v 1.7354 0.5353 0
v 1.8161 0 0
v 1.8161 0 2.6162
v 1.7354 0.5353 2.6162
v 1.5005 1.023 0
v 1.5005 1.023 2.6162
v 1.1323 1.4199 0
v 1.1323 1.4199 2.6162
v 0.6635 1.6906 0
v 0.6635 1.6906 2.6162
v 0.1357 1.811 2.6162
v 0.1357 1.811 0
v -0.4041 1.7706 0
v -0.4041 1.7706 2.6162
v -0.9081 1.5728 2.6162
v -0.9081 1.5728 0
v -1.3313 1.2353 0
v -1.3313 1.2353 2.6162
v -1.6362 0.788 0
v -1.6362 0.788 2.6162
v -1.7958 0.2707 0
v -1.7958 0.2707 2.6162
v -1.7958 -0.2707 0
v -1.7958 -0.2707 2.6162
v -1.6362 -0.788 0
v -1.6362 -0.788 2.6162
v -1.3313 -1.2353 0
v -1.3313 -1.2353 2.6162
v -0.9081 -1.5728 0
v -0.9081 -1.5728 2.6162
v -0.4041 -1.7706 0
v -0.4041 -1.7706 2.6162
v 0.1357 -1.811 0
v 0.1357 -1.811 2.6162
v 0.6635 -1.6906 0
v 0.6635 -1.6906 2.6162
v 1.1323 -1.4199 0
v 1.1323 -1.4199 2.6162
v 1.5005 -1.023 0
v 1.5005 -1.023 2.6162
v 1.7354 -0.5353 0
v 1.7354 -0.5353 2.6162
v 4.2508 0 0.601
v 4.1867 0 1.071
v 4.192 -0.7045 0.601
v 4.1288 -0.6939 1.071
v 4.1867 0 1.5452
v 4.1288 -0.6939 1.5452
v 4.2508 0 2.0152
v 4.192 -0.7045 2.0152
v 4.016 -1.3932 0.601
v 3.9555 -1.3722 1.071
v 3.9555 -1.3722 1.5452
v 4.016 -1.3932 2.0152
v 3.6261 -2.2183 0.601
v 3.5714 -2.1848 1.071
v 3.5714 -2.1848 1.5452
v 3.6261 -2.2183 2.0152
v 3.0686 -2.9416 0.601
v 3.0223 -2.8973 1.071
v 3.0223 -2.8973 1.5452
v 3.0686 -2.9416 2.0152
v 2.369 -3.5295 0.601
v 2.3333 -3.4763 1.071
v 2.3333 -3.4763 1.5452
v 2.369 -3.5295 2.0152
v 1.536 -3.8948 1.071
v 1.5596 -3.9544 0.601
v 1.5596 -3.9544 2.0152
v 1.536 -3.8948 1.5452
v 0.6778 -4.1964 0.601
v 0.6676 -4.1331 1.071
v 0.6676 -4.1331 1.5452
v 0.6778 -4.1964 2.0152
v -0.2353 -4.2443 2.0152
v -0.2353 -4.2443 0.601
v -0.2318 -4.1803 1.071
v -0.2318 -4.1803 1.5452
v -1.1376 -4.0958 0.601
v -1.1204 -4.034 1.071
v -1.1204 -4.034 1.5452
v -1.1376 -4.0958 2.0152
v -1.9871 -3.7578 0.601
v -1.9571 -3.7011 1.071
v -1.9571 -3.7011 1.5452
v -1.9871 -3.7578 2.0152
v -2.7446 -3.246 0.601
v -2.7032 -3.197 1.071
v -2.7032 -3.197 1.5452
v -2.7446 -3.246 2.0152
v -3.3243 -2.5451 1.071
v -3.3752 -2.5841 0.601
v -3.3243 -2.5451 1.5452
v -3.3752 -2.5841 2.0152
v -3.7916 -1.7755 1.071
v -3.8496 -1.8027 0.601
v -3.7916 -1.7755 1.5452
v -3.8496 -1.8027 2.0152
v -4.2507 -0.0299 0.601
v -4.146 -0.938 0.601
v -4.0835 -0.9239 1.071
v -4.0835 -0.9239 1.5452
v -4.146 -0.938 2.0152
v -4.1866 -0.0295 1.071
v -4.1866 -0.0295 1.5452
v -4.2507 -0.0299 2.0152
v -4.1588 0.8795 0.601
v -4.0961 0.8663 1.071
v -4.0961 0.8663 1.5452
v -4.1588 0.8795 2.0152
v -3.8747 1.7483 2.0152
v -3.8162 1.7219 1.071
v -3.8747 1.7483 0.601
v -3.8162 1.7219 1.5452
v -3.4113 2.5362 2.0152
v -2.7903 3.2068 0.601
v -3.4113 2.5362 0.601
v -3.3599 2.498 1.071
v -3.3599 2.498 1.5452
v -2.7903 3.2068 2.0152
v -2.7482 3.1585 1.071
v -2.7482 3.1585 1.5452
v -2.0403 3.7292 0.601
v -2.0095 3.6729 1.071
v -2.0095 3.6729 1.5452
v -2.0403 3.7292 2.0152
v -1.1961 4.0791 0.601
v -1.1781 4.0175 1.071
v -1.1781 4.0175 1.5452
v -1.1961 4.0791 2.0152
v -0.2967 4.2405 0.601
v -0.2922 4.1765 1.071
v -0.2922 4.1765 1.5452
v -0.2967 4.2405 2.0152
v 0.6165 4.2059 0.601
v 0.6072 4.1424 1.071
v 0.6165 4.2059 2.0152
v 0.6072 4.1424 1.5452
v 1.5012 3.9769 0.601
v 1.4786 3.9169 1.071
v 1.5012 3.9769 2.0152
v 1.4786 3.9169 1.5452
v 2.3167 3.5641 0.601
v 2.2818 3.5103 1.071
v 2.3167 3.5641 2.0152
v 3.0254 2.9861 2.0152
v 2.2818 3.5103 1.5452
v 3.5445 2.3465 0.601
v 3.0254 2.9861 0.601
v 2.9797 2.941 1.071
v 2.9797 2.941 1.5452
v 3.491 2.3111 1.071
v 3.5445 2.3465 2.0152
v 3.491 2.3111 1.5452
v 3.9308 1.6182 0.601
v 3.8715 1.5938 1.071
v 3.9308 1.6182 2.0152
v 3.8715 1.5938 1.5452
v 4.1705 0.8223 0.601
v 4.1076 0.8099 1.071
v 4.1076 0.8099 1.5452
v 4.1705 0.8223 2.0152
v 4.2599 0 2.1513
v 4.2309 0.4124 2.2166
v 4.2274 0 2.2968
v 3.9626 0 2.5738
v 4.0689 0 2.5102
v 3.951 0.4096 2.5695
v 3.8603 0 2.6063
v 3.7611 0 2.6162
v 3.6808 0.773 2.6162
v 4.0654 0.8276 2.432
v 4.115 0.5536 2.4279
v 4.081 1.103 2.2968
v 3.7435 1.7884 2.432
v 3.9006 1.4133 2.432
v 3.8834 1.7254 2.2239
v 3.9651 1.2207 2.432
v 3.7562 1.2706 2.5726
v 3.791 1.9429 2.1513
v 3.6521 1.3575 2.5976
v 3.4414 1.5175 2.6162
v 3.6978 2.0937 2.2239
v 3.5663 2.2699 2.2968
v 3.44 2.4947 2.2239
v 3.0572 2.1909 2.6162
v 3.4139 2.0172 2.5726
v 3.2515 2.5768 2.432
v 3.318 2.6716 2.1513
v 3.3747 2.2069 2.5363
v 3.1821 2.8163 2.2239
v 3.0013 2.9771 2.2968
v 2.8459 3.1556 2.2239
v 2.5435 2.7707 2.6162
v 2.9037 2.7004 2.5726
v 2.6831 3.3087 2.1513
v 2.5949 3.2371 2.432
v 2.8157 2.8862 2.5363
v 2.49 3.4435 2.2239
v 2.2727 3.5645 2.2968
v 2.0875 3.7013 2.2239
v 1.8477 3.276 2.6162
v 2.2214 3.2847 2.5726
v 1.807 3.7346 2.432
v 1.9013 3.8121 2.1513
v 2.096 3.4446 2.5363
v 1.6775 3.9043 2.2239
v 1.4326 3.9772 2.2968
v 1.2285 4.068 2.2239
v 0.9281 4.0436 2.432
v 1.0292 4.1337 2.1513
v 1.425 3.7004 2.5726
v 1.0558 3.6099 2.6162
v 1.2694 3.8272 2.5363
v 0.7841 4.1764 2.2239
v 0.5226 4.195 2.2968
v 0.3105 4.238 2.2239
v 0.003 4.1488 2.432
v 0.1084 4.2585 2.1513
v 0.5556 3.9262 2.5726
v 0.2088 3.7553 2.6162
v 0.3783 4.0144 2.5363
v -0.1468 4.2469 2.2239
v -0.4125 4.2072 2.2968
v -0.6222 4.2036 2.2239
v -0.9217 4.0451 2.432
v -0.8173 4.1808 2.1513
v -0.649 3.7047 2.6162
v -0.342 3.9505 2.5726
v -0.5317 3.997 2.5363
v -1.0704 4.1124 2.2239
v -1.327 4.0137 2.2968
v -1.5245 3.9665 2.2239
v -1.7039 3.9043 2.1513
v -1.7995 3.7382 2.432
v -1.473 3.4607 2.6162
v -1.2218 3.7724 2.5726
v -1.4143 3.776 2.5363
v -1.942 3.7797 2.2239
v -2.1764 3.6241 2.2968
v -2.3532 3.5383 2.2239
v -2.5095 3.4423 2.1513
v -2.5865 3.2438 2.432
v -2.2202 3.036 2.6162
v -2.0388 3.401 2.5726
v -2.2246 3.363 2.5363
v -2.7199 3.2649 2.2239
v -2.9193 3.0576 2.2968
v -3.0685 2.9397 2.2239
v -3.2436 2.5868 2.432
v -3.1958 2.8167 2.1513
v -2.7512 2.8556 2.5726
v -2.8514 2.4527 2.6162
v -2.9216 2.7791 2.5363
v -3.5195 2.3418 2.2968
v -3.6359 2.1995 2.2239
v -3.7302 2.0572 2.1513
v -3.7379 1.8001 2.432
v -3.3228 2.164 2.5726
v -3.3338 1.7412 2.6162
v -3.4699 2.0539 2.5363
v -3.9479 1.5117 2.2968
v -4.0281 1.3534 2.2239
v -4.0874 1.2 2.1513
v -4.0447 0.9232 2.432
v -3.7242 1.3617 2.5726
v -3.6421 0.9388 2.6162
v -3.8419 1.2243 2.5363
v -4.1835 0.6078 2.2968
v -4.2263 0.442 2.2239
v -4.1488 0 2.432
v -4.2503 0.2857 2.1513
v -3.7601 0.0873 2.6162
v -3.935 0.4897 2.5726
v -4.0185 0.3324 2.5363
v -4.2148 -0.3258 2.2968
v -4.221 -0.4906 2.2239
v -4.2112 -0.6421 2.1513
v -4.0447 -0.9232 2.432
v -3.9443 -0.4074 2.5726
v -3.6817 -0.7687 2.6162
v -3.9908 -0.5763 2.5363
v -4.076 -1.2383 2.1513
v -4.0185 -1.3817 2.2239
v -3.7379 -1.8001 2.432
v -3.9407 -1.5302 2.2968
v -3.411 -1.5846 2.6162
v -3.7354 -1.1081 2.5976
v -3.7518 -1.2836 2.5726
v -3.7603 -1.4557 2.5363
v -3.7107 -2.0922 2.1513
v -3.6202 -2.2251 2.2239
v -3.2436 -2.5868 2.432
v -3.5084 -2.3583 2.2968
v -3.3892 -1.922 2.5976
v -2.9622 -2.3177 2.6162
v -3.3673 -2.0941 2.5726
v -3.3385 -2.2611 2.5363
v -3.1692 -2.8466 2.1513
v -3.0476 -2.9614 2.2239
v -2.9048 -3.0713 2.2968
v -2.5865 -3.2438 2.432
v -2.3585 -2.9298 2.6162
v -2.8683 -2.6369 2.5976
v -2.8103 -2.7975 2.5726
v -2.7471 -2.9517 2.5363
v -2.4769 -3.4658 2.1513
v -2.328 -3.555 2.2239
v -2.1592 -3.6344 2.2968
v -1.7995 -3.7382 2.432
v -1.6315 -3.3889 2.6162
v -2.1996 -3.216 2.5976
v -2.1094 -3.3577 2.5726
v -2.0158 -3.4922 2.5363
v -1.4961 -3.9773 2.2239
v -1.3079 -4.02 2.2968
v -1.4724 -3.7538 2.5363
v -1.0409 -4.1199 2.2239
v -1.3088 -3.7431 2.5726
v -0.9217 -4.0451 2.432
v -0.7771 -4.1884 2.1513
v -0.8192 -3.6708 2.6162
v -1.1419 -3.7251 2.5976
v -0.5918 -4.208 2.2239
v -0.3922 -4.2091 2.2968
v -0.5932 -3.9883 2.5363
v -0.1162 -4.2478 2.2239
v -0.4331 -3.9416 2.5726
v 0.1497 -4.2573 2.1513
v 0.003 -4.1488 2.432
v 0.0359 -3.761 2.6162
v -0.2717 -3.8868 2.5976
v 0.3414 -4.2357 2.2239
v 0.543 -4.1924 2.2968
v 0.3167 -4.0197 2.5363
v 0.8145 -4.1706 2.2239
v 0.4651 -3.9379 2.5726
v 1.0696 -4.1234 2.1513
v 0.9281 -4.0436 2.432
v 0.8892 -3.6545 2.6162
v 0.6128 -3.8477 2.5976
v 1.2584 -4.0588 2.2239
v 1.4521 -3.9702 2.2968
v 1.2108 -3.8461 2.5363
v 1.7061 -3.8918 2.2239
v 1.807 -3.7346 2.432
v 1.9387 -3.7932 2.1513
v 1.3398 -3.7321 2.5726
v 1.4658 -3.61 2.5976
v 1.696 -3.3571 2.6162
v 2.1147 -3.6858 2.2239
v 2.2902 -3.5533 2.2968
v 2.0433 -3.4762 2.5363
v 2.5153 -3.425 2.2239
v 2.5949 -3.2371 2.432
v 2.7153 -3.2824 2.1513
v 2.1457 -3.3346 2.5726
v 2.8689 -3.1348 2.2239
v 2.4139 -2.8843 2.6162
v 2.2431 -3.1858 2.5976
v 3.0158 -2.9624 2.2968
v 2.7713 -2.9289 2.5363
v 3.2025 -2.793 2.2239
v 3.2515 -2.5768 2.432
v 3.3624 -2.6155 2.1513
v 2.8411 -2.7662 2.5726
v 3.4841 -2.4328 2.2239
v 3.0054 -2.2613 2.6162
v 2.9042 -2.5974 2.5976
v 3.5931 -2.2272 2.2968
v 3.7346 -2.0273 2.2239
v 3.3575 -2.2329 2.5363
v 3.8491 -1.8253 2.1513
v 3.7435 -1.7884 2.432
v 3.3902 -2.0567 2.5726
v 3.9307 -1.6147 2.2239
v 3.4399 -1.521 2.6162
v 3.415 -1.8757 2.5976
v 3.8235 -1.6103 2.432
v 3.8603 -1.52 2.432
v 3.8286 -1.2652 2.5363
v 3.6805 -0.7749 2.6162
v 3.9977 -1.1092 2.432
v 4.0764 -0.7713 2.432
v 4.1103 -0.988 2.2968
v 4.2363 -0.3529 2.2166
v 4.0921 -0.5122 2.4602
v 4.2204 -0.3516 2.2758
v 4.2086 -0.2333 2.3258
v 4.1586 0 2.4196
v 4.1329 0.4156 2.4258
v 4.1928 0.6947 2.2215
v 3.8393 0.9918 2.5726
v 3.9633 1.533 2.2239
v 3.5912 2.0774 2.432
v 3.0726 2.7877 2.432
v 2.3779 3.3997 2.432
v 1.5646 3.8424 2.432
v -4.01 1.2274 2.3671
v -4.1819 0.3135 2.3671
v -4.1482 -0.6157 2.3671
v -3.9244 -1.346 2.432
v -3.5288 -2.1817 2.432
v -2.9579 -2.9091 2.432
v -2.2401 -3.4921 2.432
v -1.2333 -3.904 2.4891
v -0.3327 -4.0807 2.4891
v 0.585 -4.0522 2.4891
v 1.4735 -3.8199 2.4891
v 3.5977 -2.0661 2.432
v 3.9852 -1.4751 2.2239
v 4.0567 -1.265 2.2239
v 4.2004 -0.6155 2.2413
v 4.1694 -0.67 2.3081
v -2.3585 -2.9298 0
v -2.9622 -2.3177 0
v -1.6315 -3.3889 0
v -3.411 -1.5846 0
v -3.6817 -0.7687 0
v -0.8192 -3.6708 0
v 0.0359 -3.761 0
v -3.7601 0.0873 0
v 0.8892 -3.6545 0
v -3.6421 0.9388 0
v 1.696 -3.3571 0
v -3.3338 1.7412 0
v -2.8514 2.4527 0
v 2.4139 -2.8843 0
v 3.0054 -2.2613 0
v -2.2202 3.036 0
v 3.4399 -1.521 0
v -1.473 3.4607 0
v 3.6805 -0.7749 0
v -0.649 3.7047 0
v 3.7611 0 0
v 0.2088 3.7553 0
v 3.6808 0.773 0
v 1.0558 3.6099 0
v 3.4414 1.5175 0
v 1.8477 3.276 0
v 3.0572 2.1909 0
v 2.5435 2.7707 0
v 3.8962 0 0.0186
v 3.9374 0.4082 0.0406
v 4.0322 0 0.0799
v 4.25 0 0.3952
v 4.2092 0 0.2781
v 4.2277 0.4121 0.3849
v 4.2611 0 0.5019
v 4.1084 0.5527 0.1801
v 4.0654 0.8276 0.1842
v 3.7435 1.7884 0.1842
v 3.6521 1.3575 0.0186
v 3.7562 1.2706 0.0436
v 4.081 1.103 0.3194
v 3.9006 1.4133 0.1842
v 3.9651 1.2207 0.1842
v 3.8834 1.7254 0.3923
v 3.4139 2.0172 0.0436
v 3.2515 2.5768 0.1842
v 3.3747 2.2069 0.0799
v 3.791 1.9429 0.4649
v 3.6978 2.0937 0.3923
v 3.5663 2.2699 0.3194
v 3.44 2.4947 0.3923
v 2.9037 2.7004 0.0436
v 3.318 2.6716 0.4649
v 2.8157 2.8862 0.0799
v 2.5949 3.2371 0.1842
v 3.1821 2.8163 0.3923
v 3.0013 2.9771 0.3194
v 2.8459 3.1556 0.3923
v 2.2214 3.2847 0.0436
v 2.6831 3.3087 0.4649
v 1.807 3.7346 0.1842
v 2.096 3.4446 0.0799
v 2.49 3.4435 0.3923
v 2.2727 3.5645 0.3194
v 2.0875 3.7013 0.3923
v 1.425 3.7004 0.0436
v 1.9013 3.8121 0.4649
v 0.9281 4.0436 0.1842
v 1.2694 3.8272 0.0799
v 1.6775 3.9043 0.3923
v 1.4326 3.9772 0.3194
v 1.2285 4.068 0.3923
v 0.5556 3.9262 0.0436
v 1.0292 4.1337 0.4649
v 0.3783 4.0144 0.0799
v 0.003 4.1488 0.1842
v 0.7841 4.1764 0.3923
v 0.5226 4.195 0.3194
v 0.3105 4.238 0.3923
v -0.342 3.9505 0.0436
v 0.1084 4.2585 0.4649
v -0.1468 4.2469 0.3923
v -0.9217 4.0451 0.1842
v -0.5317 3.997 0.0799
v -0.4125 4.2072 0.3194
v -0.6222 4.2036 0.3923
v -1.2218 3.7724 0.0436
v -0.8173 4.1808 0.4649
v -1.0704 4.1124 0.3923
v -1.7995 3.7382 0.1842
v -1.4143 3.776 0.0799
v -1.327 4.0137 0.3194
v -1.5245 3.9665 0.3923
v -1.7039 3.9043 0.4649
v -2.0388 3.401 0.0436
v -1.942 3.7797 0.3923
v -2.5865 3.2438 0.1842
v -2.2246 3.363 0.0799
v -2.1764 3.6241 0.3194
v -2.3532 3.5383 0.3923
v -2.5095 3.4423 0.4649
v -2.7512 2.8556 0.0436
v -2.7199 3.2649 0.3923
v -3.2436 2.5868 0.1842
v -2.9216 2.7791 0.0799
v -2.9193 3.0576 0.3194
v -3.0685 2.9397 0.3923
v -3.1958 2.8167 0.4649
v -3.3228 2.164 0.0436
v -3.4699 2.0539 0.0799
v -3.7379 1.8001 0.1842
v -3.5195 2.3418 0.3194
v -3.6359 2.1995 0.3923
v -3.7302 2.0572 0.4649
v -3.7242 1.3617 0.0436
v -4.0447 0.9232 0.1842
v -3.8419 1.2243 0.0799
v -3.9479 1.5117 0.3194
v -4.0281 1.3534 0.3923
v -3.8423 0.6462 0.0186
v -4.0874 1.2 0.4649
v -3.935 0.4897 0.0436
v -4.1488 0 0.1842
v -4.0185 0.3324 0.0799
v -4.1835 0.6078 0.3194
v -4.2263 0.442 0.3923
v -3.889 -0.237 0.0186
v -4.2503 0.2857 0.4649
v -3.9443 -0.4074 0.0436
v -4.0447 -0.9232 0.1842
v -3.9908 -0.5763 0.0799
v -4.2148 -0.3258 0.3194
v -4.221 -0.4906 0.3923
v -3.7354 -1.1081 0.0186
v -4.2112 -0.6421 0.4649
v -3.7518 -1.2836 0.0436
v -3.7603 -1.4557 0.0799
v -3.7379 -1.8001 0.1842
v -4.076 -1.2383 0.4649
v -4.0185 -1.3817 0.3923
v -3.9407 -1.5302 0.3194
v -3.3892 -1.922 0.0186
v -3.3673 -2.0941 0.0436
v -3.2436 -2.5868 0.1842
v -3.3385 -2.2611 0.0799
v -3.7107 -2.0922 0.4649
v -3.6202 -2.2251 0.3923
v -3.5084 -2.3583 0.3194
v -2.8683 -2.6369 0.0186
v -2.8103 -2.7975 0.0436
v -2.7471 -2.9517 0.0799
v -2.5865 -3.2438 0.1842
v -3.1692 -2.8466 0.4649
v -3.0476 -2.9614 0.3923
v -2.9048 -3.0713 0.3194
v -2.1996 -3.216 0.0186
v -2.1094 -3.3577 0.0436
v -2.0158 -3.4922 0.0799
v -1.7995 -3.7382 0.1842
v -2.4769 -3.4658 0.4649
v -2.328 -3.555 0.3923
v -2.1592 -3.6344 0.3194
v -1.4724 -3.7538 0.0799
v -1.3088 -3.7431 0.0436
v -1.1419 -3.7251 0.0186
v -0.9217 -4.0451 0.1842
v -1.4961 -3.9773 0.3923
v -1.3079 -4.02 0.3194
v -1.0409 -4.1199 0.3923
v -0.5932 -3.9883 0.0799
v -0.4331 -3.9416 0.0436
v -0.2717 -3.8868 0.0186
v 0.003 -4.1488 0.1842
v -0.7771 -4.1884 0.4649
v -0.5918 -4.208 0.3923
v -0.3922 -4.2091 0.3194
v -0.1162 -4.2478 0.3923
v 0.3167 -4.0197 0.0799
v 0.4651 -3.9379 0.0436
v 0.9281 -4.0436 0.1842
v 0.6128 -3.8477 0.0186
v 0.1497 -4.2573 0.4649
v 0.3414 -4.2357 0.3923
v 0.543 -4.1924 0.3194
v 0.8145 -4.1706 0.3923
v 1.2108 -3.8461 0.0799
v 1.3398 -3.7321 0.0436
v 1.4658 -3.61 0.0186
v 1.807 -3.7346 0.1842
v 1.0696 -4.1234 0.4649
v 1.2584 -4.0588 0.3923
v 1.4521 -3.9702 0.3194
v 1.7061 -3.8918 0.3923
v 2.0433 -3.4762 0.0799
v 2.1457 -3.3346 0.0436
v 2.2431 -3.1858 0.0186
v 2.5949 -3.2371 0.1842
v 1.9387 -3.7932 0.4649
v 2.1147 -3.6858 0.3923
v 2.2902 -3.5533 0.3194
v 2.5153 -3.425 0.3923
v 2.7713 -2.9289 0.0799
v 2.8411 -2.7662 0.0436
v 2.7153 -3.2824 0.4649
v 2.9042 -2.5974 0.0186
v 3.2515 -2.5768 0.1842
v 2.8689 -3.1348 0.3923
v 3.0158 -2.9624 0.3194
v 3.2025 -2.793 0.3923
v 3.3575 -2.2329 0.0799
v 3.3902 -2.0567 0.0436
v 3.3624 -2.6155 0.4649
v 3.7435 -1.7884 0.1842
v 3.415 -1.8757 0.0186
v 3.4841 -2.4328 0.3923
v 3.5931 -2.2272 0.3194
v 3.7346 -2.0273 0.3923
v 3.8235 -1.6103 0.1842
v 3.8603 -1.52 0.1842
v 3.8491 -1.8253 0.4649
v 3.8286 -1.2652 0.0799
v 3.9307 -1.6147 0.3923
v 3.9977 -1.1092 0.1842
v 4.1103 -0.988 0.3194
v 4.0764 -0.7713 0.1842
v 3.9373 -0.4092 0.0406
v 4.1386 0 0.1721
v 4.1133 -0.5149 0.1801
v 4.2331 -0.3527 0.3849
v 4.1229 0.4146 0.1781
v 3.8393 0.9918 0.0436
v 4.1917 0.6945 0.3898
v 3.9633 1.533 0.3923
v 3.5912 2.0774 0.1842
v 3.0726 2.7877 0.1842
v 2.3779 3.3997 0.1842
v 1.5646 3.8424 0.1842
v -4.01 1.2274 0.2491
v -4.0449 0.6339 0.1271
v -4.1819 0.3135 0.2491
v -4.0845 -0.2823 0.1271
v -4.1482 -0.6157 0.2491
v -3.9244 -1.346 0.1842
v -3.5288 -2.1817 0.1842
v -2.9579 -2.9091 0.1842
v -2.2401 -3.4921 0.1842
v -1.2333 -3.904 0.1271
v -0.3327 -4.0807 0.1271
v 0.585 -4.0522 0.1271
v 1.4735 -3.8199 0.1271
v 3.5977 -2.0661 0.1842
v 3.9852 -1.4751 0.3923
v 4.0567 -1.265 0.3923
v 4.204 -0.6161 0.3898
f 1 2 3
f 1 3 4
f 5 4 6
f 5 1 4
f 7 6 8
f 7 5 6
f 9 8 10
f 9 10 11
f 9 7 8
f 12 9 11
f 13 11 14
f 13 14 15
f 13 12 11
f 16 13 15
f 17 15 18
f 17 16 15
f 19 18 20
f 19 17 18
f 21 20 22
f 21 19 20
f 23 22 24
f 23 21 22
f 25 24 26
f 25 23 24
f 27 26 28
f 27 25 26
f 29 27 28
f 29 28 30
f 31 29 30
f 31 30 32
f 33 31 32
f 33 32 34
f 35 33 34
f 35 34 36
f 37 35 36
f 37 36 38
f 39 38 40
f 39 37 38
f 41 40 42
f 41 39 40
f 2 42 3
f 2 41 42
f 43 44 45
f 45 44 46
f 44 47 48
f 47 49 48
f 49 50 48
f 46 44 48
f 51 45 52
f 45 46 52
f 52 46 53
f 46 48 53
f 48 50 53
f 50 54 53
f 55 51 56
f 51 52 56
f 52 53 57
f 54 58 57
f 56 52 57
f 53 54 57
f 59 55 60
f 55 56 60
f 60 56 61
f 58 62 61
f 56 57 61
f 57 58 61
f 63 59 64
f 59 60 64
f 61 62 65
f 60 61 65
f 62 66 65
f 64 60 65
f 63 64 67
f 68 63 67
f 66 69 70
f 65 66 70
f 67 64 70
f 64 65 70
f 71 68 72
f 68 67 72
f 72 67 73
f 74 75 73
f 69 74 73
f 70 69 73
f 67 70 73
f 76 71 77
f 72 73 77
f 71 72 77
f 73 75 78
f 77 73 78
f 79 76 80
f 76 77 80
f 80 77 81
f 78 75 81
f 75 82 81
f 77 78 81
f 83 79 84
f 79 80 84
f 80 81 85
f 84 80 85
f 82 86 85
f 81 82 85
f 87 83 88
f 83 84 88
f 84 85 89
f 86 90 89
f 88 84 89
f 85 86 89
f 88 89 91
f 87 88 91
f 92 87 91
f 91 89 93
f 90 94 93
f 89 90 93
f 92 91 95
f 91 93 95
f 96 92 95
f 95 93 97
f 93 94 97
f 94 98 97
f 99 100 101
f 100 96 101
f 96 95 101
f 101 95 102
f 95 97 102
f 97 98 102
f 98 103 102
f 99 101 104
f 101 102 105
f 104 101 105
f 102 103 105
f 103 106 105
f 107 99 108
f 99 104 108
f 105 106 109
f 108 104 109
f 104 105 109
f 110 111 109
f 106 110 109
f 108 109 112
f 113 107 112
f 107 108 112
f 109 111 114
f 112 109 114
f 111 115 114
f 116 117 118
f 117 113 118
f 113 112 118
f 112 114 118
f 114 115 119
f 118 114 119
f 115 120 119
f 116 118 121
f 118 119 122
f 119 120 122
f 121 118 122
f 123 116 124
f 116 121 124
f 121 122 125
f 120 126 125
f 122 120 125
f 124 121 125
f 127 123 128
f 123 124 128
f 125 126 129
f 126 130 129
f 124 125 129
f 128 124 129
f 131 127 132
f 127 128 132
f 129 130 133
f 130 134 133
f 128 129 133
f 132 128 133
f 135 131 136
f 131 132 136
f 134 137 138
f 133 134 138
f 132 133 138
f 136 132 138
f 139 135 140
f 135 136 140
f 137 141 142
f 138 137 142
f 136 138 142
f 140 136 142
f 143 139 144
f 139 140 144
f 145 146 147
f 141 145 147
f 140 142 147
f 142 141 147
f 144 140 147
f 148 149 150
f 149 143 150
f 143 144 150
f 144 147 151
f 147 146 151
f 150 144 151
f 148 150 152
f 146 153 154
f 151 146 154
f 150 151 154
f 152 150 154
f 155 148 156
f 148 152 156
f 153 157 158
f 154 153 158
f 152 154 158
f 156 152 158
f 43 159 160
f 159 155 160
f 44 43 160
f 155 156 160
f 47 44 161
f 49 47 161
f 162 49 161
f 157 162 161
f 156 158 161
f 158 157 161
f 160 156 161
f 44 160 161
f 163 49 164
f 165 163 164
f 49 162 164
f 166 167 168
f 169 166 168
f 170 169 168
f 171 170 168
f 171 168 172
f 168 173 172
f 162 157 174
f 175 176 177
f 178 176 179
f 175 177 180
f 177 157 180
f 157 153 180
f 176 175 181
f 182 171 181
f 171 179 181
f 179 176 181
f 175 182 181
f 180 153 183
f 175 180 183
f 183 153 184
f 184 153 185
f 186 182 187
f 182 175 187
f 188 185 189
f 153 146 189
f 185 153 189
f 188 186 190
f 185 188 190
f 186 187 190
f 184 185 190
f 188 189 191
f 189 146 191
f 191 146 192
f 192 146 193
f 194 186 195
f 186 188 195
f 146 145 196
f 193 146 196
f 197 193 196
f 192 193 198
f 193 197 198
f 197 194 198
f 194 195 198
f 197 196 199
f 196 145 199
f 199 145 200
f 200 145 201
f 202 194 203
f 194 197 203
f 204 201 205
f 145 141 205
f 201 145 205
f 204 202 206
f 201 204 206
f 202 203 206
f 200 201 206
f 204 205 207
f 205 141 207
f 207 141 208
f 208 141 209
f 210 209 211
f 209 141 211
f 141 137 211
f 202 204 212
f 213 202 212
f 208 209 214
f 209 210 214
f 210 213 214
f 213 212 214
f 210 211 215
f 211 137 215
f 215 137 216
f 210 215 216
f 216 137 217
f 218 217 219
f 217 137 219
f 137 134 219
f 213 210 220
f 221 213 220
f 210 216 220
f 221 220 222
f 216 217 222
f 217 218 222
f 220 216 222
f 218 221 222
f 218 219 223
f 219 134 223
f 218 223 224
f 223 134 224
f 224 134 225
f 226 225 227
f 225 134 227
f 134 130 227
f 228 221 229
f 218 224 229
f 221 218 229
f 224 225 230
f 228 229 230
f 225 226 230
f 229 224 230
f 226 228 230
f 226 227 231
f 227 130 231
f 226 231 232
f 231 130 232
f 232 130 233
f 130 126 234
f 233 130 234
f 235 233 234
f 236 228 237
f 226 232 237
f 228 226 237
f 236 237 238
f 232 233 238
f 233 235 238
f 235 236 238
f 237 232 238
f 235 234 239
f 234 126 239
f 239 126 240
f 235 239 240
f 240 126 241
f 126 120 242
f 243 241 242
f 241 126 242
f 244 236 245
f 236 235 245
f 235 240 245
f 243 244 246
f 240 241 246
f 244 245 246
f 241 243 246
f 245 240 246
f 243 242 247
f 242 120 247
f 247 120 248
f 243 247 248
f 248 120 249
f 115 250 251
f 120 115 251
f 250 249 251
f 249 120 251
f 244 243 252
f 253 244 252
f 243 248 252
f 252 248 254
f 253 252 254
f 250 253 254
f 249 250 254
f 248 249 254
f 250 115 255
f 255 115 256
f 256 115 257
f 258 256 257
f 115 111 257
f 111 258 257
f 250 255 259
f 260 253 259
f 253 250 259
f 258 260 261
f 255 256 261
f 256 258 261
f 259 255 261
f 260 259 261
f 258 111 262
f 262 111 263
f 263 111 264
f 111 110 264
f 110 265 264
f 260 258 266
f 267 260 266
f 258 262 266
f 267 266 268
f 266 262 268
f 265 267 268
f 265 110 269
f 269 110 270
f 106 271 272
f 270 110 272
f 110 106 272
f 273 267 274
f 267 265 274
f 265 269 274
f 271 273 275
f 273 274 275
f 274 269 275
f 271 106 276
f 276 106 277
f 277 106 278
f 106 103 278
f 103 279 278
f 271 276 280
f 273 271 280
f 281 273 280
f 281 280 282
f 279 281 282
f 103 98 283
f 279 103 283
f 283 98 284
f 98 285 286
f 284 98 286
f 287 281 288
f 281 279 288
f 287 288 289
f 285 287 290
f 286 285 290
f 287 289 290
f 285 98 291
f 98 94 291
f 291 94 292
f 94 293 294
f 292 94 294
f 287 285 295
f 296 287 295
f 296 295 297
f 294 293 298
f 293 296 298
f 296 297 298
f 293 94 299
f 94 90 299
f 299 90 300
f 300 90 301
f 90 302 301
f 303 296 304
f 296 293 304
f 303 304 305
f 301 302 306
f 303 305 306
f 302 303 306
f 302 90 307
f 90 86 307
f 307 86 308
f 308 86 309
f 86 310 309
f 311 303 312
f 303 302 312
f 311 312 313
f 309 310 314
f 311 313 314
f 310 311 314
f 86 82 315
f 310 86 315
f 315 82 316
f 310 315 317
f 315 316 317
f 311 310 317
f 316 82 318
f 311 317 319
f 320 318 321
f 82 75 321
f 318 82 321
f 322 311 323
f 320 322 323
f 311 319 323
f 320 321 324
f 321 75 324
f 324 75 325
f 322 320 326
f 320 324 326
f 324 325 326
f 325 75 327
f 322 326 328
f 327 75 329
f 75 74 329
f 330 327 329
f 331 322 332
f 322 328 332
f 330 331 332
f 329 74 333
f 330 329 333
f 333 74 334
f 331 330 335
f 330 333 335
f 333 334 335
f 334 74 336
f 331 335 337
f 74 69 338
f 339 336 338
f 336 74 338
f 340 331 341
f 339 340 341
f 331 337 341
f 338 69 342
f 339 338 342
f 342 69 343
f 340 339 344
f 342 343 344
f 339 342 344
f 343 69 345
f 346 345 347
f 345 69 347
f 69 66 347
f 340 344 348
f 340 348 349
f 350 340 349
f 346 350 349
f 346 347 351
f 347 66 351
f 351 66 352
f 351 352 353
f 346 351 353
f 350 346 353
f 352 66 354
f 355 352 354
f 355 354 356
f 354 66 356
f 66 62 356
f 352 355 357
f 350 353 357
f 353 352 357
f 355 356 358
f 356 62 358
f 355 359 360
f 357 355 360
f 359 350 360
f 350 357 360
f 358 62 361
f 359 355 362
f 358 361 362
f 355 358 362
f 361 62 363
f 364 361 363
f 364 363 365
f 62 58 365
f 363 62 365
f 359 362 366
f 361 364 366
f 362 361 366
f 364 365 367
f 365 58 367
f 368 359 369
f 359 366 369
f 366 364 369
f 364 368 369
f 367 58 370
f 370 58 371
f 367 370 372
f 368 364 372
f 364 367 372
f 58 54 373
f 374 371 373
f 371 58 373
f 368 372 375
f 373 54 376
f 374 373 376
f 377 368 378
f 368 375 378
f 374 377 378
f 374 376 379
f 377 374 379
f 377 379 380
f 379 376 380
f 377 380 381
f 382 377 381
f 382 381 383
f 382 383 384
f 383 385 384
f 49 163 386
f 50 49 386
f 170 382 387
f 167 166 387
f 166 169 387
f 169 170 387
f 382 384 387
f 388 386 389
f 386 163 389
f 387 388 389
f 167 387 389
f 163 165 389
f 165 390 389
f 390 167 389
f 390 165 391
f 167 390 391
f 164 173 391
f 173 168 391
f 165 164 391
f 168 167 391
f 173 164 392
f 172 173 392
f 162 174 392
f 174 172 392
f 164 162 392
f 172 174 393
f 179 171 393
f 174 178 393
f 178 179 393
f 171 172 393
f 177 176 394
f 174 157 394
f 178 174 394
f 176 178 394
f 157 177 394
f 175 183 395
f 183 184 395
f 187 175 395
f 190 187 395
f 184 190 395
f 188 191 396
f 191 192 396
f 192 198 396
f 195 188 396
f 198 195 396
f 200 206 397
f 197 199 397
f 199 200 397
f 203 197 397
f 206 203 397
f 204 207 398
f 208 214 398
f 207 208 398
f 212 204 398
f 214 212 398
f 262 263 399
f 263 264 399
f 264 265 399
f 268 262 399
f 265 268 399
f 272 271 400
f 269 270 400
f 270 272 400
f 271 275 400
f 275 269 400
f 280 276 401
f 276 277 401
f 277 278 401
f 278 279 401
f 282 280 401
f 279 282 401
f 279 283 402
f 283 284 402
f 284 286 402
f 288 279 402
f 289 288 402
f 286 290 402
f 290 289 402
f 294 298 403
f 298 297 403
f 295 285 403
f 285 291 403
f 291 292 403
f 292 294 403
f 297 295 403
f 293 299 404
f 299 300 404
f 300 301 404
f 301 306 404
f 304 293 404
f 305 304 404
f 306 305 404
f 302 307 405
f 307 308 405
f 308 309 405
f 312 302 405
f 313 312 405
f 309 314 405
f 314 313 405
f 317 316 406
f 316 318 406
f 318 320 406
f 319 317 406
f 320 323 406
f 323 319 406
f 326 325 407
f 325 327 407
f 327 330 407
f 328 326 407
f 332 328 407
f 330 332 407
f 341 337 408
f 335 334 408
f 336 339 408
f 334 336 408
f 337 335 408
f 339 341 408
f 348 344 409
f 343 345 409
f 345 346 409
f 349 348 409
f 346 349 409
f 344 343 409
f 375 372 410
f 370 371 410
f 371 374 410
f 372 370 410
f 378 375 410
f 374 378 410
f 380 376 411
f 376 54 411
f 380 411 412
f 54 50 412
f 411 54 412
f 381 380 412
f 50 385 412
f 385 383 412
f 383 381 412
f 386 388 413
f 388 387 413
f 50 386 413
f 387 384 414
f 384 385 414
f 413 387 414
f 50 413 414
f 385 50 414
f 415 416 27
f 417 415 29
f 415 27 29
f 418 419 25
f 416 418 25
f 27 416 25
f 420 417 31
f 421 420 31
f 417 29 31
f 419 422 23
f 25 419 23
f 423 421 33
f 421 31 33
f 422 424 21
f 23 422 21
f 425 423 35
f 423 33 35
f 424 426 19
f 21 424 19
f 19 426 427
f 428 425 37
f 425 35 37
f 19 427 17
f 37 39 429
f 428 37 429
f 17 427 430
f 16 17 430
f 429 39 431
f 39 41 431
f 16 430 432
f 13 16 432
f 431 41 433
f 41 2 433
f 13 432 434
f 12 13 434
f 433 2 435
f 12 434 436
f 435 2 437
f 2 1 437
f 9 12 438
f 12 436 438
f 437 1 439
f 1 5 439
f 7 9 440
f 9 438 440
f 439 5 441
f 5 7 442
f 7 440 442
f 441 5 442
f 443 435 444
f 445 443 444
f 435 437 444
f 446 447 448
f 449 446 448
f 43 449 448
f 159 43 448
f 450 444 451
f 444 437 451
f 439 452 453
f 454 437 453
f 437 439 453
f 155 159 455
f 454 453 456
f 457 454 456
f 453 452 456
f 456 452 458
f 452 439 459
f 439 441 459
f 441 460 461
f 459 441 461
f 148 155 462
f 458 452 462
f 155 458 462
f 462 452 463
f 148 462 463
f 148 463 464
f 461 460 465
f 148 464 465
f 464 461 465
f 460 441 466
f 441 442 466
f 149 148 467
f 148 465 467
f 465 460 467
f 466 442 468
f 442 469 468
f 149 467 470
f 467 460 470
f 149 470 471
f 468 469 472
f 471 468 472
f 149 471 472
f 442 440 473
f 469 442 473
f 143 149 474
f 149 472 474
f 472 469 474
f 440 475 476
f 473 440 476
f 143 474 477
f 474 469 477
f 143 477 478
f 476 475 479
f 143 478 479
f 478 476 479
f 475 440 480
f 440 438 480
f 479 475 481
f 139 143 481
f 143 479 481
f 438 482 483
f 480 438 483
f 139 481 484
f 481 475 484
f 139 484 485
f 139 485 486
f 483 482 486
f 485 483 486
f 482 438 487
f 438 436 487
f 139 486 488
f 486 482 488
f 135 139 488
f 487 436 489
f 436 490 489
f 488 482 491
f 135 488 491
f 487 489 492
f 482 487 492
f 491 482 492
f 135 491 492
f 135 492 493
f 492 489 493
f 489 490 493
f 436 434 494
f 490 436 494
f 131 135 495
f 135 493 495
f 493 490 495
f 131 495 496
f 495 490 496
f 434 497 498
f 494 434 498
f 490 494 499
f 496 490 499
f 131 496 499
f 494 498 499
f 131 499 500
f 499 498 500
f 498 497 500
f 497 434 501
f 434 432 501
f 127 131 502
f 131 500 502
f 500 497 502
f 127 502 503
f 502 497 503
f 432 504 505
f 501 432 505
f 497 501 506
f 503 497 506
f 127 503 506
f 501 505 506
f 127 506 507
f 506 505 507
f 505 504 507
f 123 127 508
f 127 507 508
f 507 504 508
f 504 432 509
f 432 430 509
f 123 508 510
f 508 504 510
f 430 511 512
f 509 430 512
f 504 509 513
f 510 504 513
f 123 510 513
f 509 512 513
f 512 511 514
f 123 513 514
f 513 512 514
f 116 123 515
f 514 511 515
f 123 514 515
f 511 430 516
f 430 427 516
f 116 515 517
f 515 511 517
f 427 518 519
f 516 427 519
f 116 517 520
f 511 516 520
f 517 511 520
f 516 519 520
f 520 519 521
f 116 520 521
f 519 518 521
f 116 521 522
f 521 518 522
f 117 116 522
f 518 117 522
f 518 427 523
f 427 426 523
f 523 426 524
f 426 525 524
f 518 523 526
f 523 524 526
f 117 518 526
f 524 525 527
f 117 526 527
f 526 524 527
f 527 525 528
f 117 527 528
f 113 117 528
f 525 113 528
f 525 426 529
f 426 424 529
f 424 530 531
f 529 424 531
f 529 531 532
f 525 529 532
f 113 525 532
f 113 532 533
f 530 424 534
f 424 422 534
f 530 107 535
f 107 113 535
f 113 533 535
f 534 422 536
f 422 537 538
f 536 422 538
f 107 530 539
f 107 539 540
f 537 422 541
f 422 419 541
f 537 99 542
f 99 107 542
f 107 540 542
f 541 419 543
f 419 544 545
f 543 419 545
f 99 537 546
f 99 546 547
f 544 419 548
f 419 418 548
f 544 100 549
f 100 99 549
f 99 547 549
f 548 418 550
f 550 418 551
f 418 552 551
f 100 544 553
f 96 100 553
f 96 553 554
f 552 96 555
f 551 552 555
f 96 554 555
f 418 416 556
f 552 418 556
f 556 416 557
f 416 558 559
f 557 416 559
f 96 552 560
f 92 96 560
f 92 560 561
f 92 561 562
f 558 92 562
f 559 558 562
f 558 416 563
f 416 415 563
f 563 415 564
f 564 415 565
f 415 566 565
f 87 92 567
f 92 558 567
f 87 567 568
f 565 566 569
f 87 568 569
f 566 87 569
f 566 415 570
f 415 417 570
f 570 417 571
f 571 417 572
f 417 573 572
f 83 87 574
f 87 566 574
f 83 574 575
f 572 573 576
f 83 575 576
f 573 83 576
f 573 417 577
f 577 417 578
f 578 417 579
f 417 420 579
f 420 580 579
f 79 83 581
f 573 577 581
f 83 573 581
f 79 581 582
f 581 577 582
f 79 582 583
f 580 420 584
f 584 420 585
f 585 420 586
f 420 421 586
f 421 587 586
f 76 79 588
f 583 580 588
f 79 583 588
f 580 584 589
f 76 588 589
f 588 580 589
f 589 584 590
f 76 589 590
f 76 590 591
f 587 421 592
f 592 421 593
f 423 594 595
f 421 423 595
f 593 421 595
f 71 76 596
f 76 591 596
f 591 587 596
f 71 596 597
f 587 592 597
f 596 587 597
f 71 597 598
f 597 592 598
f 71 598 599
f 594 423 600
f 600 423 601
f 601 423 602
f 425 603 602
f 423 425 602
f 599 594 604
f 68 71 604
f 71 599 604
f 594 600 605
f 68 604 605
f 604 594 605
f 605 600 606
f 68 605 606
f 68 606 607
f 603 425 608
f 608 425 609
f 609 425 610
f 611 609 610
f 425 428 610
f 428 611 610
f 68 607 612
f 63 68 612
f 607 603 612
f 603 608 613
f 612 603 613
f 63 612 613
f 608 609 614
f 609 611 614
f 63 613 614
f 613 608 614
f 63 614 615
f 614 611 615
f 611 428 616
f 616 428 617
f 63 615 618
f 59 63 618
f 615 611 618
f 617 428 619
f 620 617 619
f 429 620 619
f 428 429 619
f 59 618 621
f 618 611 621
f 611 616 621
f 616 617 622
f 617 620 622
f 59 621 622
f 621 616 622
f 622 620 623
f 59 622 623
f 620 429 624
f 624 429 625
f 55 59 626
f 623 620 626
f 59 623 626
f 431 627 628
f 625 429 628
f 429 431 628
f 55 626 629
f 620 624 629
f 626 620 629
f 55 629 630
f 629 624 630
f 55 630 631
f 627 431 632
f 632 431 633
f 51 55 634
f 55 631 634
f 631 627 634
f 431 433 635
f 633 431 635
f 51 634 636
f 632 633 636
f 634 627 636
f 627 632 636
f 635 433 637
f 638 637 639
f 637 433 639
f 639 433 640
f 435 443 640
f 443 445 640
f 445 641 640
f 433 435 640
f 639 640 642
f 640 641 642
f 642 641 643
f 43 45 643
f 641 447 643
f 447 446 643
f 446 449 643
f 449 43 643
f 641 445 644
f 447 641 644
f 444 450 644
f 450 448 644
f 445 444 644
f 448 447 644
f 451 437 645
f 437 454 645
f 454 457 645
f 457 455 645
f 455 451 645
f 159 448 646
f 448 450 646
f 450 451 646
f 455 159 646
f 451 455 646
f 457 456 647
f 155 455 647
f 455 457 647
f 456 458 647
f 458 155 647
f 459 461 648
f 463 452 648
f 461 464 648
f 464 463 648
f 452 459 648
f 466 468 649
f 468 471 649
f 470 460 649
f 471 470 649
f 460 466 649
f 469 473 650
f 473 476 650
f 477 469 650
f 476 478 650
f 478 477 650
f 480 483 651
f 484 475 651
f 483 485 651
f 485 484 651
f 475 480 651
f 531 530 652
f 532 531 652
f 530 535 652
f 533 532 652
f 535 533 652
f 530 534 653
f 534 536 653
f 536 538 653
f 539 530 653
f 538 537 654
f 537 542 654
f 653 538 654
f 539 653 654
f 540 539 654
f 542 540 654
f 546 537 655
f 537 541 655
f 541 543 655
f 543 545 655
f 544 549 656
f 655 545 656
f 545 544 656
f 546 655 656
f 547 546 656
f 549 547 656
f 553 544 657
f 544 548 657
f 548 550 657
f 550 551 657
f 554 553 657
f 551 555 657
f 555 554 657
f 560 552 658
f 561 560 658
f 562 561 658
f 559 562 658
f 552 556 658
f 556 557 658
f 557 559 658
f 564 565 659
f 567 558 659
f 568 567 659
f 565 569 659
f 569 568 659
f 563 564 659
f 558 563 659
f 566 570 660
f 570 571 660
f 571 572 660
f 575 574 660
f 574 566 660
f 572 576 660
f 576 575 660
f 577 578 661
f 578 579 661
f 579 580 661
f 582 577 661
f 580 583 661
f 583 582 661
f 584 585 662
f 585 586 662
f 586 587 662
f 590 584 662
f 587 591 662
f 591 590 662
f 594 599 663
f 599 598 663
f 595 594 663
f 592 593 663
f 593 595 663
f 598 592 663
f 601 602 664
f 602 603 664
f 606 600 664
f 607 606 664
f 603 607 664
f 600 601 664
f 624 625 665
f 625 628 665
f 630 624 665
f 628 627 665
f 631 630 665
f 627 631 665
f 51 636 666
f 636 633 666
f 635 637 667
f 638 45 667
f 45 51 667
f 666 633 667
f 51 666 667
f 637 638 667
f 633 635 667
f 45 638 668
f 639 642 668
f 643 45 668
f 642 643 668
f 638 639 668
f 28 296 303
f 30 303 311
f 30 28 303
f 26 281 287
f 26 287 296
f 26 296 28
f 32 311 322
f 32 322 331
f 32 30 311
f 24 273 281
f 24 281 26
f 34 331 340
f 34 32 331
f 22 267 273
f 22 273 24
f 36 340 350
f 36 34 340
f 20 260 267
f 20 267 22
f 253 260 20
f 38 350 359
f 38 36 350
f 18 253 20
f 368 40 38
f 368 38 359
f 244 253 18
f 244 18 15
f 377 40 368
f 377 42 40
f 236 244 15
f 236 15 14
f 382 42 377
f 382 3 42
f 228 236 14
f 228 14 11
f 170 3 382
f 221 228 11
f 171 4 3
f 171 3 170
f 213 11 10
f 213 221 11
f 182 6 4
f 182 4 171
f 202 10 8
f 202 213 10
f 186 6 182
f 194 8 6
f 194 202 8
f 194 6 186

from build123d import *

# Parameters (mm, degrees)
SKETCH1_R           = 4.4323
SKETCH1_R_2         = 1.8161
BOSS_EXTRUDE1_DEPTH = 2.6162
FILLET1_R           = 0.5


with BuildPart() as part:
    # Sketch1 → Boss-Extrude1 (new body)
    with BuildSketch(Plane.XY):
        Circle(SKETCH1_R)
        Circle(SKETCH1_R_2, mode=Mode.SUBTRACT)
    extrude(amount=BOSS_EXTRUDE1_DEPTH)

    # Sketch2 → Cut-Revolve1 (revolve, cut)
    with BuildSketch(Plane(origin=(0, 0, 0), x_dir=(0, 0, -1), z_dir=(1, 0, 0)), mode=Mode.PRIVATE) as cut_revolve1_sk:
        with BuildLine():
            Line((-2.6162, 4.4323), (0, 4.4323))
            ThreePointArc((0, 4.4323), (-1.3081, 4.178663256), (-2.6162, 4.4323))
        make_face()
    revolve(cut_revolve1_sk.sketch.rotate(Axis((0, 0, 2.6162), (0, 0, -1)), 90), axis=Axis((0, 0, 2.6162), (0, 0, -1)), mode=Mode.SUBTRACT)

    # Fillet1
    fillet1_edges = [part.edges().sort_by_distance(p)[0] for p in [
        (-4.4323, 0, 2.6162),
        (-4.4323, 0, 0),
    ]]
    fillet(fillet1_edges, radius=FILLET1_R)


solid = part.part
